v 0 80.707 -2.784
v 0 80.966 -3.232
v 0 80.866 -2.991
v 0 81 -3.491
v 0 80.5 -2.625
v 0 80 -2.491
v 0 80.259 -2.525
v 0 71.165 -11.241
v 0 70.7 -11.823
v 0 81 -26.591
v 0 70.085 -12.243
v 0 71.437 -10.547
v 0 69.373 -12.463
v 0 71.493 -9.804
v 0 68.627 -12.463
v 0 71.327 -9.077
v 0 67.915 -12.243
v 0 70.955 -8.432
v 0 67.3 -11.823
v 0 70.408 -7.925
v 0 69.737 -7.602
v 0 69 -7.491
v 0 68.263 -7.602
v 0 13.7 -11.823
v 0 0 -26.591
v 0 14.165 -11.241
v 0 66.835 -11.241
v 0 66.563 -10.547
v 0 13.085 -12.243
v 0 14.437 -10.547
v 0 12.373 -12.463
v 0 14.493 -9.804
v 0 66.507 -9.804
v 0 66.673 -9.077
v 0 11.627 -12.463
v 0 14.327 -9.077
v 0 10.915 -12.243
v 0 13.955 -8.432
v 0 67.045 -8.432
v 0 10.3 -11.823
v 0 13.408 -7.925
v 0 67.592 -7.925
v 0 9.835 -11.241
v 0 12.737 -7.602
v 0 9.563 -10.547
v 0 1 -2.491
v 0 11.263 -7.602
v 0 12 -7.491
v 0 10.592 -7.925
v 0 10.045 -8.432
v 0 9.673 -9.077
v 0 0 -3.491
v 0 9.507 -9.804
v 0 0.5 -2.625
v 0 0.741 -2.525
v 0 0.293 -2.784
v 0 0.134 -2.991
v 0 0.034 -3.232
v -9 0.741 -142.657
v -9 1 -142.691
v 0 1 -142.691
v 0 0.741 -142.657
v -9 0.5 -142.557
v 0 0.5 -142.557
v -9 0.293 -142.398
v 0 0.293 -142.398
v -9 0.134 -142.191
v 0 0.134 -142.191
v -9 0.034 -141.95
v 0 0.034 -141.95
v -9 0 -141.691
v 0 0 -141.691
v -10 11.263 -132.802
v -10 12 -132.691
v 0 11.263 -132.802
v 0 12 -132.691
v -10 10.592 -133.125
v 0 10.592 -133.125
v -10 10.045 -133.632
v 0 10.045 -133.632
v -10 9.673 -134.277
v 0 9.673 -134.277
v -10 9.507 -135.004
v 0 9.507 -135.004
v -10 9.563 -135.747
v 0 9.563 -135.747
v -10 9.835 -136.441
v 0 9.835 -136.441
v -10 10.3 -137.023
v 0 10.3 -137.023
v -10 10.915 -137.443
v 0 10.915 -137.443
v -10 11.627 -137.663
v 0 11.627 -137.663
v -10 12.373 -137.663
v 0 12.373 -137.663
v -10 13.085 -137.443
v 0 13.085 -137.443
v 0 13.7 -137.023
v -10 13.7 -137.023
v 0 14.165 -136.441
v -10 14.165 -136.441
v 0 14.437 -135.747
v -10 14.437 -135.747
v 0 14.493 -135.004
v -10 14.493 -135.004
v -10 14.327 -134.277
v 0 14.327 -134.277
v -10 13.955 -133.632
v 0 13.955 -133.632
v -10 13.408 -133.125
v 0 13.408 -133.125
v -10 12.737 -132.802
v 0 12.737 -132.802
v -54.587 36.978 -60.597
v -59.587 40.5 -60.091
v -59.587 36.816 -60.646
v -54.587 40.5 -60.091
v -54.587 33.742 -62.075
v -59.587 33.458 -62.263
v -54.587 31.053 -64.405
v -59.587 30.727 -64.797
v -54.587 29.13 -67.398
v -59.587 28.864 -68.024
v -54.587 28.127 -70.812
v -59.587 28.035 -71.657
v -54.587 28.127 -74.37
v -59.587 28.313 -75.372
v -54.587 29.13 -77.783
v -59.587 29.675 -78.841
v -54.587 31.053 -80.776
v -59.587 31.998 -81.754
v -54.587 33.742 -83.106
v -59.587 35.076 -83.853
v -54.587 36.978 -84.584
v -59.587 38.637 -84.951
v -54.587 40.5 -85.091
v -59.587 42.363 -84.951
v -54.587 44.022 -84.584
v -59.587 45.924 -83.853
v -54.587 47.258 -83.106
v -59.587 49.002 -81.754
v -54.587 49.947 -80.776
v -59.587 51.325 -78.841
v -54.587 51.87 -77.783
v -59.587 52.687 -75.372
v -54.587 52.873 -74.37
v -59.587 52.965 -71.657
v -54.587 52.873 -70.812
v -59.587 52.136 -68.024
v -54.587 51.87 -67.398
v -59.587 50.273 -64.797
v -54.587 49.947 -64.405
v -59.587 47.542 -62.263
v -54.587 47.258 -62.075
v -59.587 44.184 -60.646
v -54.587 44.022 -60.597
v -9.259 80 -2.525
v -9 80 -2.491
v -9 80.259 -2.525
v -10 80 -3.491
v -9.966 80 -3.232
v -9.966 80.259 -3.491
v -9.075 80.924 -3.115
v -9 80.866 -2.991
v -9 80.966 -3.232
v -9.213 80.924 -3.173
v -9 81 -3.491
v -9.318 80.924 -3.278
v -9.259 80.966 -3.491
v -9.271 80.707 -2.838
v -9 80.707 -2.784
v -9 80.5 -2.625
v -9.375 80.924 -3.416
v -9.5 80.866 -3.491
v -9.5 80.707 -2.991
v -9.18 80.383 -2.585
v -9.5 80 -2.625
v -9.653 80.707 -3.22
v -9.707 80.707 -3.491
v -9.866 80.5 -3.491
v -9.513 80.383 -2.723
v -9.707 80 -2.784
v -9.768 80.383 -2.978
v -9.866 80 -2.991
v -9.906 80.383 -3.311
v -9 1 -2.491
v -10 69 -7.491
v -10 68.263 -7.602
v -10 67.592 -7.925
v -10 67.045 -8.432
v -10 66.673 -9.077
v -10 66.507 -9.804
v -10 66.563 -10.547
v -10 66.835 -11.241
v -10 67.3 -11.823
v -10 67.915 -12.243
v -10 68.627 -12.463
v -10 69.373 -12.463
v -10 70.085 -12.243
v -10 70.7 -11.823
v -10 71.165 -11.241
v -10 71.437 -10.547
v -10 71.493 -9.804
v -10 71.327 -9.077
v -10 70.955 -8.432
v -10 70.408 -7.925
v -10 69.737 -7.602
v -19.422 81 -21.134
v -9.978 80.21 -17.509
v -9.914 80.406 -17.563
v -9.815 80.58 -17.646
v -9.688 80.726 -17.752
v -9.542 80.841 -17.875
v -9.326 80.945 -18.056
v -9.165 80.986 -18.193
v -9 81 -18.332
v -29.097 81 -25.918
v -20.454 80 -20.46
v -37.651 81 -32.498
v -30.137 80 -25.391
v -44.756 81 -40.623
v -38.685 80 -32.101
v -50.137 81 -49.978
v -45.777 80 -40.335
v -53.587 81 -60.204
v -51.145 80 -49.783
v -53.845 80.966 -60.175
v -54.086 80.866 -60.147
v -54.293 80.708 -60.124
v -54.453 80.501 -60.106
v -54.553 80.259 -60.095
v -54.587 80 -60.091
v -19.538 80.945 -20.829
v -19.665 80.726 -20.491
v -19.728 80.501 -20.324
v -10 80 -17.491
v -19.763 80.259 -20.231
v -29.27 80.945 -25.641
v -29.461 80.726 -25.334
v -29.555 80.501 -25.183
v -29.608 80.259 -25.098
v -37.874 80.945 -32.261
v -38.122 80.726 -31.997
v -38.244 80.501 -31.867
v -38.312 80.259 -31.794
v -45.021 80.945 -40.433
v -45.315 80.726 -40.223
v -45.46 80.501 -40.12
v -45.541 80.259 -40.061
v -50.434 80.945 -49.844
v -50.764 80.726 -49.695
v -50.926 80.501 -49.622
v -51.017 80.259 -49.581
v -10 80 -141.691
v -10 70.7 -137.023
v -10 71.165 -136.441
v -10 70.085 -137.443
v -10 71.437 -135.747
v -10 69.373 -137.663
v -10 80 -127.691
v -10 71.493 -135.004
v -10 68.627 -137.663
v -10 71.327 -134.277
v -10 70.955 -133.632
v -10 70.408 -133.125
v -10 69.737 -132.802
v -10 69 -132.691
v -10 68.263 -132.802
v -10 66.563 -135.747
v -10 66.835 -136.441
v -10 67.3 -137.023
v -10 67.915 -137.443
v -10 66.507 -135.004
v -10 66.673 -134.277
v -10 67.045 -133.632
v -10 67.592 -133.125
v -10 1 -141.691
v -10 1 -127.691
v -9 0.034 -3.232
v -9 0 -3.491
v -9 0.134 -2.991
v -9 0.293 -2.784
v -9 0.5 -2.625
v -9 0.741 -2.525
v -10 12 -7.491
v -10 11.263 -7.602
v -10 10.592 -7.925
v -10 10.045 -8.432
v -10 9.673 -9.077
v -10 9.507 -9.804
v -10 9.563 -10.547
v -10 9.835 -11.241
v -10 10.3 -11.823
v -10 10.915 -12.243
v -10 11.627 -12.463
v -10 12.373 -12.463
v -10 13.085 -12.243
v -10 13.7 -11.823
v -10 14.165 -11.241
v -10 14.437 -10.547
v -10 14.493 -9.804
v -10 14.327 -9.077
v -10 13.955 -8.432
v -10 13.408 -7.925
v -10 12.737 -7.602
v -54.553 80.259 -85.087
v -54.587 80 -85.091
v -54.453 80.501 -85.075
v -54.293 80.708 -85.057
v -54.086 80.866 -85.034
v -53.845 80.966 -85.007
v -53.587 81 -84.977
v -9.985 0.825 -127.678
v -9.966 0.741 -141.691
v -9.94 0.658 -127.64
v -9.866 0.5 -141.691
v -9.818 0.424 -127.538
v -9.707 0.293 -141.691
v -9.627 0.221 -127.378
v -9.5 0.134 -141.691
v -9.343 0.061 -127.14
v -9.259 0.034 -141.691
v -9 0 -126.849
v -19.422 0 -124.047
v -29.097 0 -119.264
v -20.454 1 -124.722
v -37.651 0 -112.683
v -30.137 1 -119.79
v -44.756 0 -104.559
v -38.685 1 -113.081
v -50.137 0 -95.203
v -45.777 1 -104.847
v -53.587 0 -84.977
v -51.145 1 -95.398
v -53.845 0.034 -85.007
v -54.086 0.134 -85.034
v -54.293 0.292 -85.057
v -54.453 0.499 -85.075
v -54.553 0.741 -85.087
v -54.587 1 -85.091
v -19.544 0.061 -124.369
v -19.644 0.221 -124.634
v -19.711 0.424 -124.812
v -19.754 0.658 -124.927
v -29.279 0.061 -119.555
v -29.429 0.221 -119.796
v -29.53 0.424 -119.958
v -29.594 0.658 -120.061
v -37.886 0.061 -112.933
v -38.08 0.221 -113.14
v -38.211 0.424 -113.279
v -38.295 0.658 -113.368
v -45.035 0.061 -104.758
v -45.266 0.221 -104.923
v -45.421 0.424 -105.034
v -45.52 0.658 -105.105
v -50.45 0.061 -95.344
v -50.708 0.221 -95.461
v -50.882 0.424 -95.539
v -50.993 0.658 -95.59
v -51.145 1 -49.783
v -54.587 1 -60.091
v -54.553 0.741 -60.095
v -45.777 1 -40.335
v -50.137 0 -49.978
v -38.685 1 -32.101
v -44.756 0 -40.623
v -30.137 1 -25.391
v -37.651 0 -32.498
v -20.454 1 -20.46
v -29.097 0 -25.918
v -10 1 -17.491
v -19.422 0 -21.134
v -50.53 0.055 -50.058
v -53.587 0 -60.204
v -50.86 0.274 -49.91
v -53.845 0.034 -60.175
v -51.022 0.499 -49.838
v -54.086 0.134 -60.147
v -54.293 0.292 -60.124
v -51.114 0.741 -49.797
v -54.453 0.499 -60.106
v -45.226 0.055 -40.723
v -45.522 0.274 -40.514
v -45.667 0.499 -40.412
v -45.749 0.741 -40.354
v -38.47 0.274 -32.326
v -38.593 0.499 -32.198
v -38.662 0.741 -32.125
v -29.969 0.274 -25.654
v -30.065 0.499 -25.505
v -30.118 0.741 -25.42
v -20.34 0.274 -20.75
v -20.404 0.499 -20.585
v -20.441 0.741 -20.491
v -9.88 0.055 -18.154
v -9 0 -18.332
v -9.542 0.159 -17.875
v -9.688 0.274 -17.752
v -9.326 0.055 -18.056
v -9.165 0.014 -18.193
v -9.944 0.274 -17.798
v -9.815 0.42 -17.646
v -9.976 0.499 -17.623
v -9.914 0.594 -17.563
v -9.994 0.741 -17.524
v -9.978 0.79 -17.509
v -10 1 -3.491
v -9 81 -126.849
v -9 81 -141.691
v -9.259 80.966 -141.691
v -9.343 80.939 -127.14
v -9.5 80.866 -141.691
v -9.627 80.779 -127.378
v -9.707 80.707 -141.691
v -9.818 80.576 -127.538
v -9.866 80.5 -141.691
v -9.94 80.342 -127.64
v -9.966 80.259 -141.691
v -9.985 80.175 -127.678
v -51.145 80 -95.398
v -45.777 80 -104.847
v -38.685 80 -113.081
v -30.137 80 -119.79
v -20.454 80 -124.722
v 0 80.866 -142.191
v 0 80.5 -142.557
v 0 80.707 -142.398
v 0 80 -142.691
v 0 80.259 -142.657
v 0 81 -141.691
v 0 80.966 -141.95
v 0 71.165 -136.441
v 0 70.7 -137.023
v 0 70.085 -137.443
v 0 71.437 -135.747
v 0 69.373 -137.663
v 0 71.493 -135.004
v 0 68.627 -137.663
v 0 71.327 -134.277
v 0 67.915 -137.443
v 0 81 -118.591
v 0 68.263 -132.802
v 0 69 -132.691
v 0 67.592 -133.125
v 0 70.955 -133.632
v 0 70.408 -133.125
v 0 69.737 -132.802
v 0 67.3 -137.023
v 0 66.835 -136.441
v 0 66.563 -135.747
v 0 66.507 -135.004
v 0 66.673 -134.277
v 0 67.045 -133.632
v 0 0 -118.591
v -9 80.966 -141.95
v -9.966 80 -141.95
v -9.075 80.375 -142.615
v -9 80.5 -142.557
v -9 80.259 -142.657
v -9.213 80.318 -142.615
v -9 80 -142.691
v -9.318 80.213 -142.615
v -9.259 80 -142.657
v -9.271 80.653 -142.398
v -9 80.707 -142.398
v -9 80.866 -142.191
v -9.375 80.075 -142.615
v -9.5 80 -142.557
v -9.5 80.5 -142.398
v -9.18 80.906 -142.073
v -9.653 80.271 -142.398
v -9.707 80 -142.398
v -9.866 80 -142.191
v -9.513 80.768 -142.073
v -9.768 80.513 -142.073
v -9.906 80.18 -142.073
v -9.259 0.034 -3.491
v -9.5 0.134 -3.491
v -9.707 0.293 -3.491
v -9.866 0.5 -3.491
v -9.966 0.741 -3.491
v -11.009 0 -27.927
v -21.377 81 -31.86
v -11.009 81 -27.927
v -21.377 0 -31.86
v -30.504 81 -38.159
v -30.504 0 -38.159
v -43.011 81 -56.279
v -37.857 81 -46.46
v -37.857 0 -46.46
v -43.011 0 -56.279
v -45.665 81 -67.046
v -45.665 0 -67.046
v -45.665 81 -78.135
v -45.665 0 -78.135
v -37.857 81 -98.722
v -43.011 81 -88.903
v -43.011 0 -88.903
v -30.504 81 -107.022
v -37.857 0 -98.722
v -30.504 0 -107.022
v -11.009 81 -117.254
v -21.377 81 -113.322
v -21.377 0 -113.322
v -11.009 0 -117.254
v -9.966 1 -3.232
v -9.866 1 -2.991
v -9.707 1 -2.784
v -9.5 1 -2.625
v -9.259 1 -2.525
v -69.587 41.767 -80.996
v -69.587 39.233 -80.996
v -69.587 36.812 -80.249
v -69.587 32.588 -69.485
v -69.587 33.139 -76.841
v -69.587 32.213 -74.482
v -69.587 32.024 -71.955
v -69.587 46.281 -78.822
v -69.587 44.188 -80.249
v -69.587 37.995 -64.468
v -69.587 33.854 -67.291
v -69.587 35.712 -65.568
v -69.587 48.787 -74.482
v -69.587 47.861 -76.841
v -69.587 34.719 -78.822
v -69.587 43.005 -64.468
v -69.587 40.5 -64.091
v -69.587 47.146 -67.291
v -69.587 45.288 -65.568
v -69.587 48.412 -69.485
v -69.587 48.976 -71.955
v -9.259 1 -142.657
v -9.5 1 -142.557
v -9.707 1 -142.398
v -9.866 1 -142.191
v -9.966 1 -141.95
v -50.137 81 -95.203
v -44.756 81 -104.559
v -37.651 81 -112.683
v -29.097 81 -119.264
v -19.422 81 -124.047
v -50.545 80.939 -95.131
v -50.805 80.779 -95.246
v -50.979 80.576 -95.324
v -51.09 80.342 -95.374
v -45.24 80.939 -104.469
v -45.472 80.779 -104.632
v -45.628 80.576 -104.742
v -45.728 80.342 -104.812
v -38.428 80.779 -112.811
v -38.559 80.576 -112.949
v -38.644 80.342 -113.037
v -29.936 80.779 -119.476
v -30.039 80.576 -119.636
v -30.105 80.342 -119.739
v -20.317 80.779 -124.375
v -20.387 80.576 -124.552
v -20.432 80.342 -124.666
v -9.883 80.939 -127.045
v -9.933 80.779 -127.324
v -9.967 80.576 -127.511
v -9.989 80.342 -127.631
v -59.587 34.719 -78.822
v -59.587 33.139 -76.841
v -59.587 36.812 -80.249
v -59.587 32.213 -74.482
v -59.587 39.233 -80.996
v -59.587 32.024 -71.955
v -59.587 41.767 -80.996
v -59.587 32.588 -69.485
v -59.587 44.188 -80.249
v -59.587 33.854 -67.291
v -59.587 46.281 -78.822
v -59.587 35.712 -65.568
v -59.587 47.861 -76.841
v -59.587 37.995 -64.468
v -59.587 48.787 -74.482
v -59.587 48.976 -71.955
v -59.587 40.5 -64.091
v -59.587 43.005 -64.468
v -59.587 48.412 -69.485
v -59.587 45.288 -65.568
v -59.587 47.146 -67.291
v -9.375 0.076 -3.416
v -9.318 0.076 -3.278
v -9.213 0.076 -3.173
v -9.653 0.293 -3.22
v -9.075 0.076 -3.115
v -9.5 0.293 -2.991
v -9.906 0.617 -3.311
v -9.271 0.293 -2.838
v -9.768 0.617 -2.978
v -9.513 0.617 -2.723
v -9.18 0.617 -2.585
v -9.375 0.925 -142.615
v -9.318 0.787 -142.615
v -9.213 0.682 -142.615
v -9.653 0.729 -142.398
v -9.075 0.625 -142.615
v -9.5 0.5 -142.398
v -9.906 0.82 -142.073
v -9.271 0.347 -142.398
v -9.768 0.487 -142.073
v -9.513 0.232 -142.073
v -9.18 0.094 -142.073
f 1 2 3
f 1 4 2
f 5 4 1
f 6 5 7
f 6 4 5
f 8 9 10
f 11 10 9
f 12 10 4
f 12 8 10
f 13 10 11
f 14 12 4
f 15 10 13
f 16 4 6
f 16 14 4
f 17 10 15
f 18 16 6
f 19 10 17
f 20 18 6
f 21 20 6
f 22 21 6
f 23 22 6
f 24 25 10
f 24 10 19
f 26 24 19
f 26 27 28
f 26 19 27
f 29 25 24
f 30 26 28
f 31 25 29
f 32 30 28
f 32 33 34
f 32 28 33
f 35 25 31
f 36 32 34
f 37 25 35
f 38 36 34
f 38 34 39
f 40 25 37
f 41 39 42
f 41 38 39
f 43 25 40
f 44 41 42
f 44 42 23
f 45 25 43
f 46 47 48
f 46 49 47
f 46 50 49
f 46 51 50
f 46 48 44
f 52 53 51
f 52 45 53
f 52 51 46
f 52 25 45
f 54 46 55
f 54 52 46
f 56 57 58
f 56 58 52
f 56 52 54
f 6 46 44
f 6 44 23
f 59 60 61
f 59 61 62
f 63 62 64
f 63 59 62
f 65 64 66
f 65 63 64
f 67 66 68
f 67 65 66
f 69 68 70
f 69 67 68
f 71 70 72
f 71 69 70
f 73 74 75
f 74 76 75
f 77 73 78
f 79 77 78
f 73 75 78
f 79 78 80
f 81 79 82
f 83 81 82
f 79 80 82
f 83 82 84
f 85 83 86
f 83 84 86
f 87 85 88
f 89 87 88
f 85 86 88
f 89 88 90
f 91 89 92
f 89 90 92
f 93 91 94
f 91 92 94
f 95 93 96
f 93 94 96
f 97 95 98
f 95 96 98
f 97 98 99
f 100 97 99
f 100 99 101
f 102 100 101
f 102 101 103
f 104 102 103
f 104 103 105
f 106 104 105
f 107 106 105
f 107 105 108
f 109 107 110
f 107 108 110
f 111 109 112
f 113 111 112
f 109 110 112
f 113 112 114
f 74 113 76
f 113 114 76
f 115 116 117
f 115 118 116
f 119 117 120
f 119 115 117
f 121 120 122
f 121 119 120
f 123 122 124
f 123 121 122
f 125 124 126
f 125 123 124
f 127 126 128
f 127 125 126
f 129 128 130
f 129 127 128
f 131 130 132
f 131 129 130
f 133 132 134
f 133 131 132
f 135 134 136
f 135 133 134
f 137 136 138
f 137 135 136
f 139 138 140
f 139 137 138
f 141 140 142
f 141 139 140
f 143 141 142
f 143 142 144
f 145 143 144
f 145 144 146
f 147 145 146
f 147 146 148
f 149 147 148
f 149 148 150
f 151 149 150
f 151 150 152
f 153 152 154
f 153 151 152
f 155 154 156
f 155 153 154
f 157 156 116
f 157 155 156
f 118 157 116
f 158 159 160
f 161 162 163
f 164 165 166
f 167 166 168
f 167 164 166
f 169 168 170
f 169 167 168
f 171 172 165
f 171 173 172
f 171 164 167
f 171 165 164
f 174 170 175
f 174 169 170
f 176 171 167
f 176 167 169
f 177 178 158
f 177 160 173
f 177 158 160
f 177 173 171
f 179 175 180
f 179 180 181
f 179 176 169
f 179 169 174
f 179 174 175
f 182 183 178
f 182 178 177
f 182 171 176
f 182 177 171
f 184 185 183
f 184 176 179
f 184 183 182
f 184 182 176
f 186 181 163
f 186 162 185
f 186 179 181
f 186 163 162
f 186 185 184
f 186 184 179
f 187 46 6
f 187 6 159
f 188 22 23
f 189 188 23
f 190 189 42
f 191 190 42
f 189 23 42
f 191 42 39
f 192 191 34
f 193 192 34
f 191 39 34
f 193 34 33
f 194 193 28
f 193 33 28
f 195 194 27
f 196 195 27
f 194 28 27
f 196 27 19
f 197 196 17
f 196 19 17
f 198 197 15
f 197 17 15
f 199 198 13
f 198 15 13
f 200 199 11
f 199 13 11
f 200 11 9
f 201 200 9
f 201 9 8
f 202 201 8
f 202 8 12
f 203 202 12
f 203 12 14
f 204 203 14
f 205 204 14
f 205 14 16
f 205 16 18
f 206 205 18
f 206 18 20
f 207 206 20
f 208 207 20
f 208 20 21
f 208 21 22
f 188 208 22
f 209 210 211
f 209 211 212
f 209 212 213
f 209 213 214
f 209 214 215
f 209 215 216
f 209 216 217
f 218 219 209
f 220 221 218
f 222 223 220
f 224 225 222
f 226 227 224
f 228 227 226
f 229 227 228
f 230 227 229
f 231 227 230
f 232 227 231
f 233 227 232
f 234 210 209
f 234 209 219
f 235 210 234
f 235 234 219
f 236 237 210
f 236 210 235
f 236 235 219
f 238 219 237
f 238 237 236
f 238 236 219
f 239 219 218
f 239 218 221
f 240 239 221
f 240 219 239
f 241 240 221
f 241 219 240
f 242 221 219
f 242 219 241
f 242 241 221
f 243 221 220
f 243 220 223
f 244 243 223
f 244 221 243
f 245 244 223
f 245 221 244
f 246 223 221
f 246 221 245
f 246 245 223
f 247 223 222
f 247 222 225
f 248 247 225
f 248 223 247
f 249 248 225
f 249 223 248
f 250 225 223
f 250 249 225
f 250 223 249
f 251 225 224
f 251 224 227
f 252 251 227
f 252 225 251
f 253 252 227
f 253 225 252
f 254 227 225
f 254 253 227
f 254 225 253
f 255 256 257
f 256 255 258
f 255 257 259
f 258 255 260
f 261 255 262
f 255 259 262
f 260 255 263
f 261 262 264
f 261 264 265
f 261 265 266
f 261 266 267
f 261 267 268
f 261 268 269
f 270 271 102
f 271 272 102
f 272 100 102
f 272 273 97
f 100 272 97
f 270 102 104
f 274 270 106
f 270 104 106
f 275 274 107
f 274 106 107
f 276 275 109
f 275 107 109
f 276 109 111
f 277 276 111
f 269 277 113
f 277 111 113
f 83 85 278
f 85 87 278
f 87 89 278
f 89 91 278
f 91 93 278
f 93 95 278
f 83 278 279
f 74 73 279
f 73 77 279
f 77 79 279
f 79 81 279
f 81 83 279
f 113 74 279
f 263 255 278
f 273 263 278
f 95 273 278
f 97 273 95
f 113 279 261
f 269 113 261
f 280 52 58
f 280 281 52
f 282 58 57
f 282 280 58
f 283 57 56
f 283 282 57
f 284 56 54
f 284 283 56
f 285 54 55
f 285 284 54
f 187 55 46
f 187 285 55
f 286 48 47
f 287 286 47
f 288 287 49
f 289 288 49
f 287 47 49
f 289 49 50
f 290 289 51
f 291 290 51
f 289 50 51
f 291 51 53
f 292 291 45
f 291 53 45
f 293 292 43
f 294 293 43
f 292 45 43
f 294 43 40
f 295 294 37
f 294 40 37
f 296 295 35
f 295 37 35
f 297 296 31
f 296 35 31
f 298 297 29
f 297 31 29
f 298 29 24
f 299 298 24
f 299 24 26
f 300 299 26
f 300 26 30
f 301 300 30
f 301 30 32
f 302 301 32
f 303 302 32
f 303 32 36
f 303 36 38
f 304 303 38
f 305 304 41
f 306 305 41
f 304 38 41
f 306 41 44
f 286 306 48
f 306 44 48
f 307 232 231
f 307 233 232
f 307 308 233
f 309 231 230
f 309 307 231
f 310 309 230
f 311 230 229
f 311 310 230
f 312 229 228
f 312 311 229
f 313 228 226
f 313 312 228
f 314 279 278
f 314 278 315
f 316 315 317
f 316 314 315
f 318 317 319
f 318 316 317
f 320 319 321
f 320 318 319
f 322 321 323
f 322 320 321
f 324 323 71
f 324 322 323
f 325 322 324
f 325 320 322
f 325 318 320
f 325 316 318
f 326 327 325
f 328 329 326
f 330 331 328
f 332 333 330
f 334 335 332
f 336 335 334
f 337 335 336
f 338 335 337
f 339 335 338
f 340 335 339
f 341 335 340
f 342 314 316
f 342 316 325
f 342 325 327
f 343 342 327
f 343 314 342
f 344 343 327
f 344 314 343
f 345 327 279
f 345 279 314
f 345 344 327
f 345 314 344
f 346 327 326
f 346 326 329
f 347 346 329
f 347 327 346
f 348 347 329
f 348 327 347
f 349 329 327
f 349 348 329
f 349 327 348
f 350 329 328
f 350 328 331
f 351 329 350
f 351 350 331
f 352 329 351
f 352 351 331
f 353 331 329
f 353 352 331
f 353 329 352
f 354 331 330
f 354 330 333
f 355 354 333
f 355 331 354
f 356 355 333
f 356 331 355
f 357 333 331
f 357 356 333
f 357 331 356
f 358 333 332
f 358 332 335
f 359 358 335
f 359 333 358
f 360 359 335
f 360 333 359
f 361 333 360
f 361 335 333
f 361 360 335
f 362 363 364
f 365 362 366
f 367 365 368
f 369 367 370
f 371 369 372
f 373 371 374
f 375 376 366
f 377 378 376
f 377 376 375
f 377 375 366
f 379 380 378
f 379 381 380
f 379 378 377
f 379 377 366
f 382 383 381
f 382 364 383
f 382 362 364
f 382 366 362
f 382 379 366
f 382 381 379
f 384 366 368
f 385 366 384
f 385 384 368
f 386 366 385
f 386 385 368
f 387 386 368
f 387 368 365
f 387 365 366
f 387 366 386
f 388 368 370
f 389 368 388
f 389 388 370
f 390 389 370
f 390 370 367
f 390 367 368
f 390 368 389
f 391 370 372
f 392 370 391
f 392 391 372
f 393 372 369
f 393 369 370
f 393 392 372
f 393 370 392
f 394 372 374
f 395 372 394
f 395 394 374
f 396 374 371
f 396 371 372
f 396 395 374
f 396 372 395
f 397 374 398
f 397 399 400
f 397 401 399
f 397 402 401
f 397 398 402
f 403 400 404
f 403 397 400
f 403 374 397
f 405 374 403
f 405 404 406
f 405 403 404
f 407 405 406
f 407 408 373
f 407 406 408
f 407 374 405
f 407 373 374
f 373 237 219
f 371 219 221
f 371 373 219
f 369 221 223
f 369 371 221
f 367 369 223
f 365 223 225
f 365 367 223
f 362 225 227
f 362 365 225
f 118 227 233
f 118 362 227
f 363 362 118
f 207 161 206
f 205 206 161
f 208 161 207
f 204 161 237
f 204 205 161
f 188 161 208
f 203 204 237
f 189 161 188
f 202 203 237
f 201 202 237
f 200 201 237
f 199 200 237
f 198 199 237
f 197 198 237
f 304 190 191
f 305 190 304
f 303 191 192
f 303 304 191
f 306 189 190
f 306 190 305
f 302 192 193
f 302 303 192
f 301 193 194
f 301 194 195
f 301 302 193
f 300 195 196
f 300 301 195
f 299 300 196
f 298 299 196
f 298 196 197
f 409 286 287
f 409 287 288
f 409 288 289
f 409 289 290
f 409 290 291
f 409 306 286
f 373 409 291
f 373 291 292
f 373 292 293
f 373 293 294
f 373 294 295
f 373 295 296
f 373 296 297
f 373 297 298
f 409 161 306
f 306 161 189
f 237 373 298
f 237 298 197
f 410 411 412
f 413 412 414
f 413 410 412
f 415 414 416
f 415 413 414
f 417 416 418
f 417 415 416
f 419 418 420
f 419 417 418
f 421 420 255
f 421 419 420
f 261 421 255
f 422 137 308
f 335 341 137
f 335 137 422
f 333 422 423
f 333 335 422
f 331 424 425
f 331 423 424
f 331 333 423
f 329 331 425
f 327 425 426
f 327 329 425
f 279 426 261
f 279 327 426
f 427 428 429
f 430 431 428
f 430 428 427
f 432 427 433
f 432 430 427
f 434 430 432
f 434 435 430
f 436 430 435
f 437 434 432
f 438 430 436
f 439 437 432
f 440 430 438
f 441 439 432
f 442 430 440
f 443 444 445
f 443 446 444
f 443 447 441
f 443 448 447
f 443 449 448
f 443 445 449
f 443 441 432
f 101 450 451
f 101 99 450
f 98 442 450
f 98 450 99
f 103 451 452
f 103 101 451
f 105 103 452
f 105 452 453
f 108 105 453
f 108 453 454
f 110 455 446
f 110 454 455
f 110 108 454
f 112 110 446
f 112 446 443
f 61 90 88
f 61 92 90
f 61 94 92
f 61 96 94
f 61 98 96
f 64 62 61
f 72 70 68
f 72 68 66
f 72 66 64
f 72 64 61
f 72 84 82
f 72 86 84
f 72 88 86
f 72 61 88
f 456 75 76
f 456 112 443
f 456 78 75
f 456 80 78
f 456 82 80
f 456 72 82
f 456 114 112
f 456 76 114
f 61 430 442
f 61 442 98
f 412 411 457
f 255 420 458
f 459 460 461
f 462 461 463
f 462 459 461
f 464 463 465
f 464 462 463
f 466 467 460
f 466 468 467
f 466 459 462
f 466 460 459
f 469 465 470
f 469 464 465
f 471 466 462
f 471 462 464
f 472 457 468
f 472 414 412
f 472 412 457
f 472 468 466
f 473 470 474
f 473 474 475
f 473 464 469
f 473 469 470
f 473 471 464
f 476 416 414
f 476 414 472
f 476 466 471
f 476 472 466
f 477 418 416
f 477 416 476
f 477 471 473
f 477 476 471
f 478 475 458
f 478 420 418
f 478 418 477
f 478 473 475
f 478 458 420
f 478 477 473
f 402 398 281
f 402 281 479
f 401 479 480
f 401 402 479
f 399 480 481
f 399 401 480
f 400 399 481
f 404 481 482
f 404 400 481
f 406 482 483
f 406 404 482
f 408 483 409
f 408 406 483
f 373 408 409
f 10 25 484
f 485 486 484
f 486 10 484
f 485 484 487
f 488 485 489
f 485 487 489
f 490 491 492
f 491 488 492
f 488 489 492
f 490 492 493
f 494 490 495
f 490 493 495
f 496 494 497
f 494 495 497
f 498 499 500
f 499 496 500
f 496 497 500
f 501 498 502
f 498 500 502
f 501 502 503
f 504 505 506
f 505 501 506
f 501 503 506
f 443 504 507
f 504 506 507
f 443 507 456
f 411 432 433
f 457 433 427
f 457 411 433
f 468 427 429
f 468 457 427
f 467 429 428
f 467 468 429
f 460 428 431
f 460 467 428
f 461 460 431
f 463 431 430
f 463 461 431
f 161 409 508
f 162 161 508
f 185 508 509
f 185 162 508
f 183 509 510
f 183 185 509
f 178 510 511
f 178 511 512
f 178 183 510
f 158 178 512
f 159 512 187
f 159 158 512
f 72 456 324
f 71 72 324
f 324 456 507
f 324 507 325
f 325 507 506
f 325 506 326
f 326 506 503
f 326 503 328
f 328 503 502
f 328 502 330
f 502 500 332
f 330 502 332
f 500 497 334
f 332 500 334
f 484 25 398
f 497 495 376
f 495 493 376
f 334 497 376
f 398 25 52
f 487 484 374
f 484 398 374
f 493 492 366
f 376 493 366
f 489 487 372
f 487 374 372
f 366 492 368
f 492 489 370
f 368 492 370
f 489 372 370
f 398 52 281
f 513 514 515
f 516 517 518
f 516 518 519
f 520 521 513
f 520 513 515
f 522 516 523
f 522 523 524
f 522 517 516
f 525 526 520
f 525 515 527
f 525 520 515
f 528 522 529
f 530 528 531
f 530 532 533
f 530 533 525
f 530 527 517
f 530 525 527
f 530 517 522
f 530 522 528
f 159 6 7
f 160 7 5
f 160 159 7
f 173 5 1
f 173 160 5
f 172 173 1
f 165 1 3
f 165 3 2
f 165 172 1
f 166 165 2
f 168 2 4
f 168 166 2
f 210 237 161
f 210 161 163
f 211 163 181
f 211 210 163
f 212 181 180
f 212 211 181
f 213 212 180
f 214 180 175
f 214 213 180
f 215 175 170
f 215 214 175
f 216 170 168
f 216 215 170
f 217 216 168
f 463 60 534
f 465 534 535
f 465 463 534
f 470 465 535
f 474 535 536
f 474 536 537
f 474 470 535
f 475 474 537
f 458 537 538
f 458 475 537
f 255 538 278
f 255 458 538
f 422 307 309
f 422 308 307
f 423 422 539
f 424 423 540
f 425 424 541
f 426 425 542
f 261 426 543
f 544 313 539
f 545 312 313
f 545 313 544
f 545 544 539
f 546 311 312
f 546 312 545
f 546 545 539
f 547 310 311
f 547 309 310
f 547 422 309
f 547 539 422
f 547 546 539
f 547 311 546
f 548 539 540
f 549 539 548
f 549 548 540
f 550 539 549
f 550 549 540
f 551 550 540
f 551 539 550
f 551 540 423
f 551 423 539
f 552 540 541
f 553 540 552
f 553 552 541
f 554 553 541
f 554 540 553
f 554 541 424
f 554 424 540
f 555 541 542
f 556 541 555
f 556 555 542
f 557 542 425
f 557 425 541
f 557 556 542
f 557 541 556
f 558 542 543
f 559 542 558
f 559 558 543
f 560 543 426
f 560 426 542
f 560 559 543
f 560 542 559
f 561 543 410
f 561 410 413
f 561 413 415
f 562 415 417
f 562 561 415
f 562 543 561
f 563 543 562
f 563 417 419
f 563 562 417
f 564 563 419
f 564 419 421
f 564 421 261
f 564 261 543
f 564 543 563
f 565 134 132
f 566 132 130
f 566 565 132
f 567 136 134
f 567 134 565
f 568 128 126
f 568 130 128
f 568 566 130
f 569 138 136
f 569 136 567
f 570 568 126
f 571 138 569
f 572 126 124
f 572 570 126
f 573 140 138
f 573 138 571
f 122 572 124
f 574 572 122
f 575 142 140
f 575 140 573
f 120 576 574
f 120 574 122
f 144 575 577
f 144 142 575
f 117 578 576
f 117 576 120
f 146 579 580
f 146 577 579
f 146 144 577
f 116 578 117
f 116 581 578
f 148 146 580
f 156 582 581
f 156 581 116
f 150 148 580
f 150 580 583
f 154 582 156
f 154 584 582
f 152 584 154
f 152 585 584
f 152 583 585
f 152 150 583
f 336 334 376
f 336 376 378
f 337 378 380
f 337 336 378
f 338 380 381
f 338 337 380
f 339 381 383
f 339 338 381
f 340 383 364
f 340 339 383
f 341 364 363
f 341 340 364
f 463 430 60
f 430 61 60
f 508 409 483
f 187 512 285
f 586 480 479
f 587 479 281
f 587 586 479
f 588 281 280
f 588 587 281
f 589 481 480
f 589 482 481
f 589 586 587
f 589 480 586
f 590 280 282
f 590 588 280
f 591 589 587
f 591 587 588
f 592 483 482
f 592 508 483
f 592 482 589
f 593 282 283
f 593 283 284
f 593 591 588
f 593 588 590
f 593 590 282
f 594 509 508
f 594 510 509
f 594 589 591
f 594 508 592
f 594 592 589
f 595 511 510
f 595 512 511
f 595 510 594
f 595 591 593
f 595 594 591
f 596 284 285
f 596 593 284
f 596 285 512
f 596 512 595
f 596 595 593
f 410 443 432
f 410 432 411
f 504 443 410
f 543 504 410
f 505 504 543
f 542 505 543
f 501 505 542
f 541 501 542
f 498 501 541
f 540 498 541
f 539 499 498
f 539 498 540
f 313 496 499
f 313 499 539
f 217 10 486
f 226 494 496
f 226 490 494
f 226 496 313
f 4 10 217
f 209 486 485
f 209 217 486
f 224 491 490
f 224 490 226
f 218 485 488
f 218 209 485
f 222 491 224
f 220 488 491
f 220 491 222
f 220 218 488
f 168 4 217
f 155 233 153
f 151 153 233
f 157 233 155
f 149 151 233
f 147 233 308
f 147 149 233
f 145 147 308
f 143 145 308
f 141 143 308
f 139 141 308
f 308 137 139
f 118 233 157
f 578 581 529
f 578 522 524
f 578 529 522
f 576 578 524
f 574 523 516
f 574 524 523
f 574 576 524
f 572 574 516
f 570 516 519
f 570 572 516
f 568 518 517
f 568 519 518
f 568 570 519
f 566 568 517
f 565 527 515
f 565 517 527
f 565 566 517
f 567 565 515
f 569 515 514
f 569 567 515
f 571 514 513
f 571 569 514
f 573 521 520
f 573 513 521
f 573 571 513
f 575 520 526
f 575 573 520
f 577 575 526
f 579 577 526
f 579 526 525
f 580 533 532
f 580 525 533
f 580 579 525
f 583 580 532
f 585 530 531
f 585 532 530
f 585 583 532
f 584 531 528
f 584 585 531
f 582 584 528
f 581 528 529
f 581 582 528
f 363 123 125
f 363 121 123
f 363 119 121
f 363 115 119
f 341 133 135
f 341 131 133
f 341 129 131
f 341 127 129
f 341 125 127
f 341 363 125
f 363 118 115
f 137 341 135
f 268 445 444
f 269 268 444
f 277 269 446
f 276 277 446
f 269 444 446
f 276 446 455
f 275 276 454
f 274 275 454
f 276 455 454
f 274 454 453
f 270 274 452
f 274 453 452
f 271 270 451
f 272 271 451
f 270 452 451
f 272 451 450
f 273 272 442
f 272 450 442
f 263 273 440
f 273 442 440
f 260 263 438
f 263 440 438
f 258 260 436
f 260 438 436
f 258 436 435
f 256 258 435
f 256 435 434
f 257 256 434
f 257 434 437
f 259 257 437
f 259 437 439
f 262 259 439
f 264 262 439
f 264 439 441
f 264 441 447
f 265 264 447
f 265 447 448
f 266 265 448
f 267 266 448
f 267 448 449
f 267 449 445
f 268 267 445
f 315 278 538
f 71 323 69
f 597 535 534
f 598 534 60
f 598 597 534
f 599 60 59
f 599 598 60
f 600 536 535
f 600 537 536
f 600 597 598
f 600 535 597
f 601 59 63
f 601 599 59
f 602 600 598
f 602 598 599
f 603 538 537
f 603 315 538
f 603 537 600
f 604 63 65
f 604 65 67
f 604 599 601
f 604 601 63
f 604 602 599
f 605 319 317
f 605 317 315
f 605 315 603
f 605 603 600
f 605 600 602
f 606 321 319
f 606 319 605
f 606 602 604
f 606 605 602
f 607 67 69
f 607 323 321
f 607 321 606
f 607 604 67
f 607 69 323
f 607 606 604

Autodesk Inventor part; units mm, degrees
ref_plane "YZ Plane" through (0, 0, 0) normal (1, 0, 0) x (0, 1, 0)
ref_plane "XZ Plane" through (0, 0, 0) normal (0, 1, 0) x (-1, 0, 0)
ref_plane "XY Plane" through (0, 0, 0) normal (0, 0, 1) x (1, 0, 0)
sketch "スケッチ1" plane through (0, 0, 0) normal (0, 1, 0) x (-1, 0, 0)
  line L0 (0, 0) -> (70, 0)
  line L1 (70, 0) -> (70, -170)
  line L2 (70, -170) -> (0, -170)
  line L3 (0, -170) -> (0, 0)
  arc A0 (0, -118.5907) -> (0, -26.5907) centre (0, -72.5907) ccw
  arc A1 (0, -128.5907) -> (0, -16.5907) centre (0, -72.5907) ccw
  line L4 (10, -17.4908) -> (0, -17.4908)
  line L5 (0, -17.4908) -> (0, -2.4908)
  line L6 (0, -2.4908) -> (10, -2.4908)
  line L7 (10, -2.4908) -> (10, -17.4908)
  line L8 (10, -127.6907) -> (0, -127.6907)
  line L9 (0, -127.6907) -> (0, -142.6907)
  line L10 (0, -142.6907) -> (10, -142.6907)
  line L11 (10, -142.6907) -> (10, -127.6907)
  line L12 (54.5871, -60.0907) -> (54.5871, -85.0907)
  point P0 (0, -17.4908)
  dimension "d0" = 70
  dimension "d1" = 170
  dimension "d2" = 46
  dimension "d3" = 56
  dimension "d4" = 10
  dimension "d5" = 10
  dimension "d6" = 15
  dimension "d7" = 15
  dimension "d8" = 25
extrude "押し出し1" add sketch "スケッチ1" along normal blind 81 contours L6 L7 A1 L3 | A1 L4 L3 | L4 A1 L12 L8 L3 A0 | L3 A1 L11 L10 | L3 L8 A1
ref_plane "作業平面1" through (-54.5871, 0, -85.0907) normal (-1, 0, 0) x (0, 0, 1)
sketch "スケッチ2" plane through (-54.5871, 0, -85.0907) normal (-1, 0, 0) x (0, 0, 1)
  line L0 (-33.5, 81) -> (58.5, 81) projected
  line L1 (25, 0) -> (25, 81) projected
  circle A0 centre (12.5, 40.5) radius 12.5
  line L2 (0, 0) -> (0, 81) projected
  line L3 (0, 0) -> (25, 0) projected
  line L4 (-57.5999, 0) -> (-57.5999, 81) projected
  line L5 (82.5999, 0) -> (82.5999, 81) projected
  point P0 (85.0907, 0)
  point P1 (12.5, 0)
  point P2 (-57.5999, 40.5)
  point P3 (82.5999, 40.5)
  dimension "d12" = 25
  dimension "d40" = 70.0999
  dimension "d41" = 70.0999
extrude "押し出し2" add sketch "スケッチ2" along normal blind 5 contours A0
ref_plane "作業平面2" through (-59.5871, 40.5, -72.5907) normal (-1, 0, 0) x (0, 0, 1)
ref_plane "作業平面3" through (-10, 0, -142.6907) normal (-1, 0, 0) x (0, 0, 1)
sketch "スケッチ4" plane through (-10, 0, -142.6907) normal (-1, 0, 0) x (0, 0, 1)
  line L0 (0, 81) -> (15, 81) projected
  line L1 (0, 0) -> (15, 0) projected
  line L2 (125.1998, 0) -> (140.1998, 0) projected
  line L3 (125.1998, 81) -> (140.1998, 81) projected
  point P0 (142.6907, 0)
  point P1 (7.5, 69)
  point P2 (7.5, 12)
  point P3 (132.6998, 12)
  point P4 (132.6998, 69)
  point P5 (7.5, 81)
  point P6 (7.5, 0)
  point P7 (132.6998, 0)
  point P8 (132.6998, 81)
  dimension "d20" = 0
  dimension "d21" = 12
  dimension "d22" = 0
  dimension "d23" = 12
  dimension "d24" = 0
  dimension "d25" = 12
  dimension "d26" = 0
  dimension "d27" = 12
hole "穴1" at (-10, 69, -135.1907) at (-10, 12, -135.1907) at (-10, 12, -9.9908) at (-10, 69, -9.9908) direction (1, 0, 0) diameter 5 end through all
fillet "フィレット1" radius 1 16 edges at (-10, 40.5, -2.4908) (-5, 81, -2.4908) (-10, 81, -9.9908) (-38.6854, 81, -32.1008) (-38.6854, 81, -113.0807) (-10, 81, -135.1907) (-5, 81, -142.6907) (-10, 0, -9.9908) (-38.6854, 0, -32.1008) (-5, 0, -2.4908) (-38.6854, 0, -113.0807) (-54.5871, 0, -72.5907) (-10, 0, -135.1907) (-5, 0, -142.6907) (-10, 40.5, -142.6907) (-54.5871, 81, -72.5907)
sketch "スケッチ8" plane through (-59.5871, 40.5, -72.5907) normal (-1, 0, 0) x (0, 0, 1)
  circle A0 centre (0, 0) radius 8.5
  point P0 (72.5907, -40.5)
  dimension "d46" = 17
extrude "押し出し4" add sketch "スケッチ8" along normal blind 10
sketch "スケッチ9" plane through (-69.5871, 40.5, -72.5907) normal (-1, 0, 0) x (0, 0, 1)
  circle A0 centre (0, 0) radius 8.5 projected
  line L0 (-70.0999, 39.5) -> (-70.0999, -39.5) projected
  line L1 (12.3865, 40.5) -> (-12.3865, 40.5) projected
  line L2 (70.0999, -39.5) -> (70.0999, 39.5) projected
  point P0 (72.5907, -40.5)
  dimension "d49" = 70.0999
  dimension "d50" = 40.5
  dimension "d51" = 70.0999
properties part number "motor_mount2_3D プリント"
